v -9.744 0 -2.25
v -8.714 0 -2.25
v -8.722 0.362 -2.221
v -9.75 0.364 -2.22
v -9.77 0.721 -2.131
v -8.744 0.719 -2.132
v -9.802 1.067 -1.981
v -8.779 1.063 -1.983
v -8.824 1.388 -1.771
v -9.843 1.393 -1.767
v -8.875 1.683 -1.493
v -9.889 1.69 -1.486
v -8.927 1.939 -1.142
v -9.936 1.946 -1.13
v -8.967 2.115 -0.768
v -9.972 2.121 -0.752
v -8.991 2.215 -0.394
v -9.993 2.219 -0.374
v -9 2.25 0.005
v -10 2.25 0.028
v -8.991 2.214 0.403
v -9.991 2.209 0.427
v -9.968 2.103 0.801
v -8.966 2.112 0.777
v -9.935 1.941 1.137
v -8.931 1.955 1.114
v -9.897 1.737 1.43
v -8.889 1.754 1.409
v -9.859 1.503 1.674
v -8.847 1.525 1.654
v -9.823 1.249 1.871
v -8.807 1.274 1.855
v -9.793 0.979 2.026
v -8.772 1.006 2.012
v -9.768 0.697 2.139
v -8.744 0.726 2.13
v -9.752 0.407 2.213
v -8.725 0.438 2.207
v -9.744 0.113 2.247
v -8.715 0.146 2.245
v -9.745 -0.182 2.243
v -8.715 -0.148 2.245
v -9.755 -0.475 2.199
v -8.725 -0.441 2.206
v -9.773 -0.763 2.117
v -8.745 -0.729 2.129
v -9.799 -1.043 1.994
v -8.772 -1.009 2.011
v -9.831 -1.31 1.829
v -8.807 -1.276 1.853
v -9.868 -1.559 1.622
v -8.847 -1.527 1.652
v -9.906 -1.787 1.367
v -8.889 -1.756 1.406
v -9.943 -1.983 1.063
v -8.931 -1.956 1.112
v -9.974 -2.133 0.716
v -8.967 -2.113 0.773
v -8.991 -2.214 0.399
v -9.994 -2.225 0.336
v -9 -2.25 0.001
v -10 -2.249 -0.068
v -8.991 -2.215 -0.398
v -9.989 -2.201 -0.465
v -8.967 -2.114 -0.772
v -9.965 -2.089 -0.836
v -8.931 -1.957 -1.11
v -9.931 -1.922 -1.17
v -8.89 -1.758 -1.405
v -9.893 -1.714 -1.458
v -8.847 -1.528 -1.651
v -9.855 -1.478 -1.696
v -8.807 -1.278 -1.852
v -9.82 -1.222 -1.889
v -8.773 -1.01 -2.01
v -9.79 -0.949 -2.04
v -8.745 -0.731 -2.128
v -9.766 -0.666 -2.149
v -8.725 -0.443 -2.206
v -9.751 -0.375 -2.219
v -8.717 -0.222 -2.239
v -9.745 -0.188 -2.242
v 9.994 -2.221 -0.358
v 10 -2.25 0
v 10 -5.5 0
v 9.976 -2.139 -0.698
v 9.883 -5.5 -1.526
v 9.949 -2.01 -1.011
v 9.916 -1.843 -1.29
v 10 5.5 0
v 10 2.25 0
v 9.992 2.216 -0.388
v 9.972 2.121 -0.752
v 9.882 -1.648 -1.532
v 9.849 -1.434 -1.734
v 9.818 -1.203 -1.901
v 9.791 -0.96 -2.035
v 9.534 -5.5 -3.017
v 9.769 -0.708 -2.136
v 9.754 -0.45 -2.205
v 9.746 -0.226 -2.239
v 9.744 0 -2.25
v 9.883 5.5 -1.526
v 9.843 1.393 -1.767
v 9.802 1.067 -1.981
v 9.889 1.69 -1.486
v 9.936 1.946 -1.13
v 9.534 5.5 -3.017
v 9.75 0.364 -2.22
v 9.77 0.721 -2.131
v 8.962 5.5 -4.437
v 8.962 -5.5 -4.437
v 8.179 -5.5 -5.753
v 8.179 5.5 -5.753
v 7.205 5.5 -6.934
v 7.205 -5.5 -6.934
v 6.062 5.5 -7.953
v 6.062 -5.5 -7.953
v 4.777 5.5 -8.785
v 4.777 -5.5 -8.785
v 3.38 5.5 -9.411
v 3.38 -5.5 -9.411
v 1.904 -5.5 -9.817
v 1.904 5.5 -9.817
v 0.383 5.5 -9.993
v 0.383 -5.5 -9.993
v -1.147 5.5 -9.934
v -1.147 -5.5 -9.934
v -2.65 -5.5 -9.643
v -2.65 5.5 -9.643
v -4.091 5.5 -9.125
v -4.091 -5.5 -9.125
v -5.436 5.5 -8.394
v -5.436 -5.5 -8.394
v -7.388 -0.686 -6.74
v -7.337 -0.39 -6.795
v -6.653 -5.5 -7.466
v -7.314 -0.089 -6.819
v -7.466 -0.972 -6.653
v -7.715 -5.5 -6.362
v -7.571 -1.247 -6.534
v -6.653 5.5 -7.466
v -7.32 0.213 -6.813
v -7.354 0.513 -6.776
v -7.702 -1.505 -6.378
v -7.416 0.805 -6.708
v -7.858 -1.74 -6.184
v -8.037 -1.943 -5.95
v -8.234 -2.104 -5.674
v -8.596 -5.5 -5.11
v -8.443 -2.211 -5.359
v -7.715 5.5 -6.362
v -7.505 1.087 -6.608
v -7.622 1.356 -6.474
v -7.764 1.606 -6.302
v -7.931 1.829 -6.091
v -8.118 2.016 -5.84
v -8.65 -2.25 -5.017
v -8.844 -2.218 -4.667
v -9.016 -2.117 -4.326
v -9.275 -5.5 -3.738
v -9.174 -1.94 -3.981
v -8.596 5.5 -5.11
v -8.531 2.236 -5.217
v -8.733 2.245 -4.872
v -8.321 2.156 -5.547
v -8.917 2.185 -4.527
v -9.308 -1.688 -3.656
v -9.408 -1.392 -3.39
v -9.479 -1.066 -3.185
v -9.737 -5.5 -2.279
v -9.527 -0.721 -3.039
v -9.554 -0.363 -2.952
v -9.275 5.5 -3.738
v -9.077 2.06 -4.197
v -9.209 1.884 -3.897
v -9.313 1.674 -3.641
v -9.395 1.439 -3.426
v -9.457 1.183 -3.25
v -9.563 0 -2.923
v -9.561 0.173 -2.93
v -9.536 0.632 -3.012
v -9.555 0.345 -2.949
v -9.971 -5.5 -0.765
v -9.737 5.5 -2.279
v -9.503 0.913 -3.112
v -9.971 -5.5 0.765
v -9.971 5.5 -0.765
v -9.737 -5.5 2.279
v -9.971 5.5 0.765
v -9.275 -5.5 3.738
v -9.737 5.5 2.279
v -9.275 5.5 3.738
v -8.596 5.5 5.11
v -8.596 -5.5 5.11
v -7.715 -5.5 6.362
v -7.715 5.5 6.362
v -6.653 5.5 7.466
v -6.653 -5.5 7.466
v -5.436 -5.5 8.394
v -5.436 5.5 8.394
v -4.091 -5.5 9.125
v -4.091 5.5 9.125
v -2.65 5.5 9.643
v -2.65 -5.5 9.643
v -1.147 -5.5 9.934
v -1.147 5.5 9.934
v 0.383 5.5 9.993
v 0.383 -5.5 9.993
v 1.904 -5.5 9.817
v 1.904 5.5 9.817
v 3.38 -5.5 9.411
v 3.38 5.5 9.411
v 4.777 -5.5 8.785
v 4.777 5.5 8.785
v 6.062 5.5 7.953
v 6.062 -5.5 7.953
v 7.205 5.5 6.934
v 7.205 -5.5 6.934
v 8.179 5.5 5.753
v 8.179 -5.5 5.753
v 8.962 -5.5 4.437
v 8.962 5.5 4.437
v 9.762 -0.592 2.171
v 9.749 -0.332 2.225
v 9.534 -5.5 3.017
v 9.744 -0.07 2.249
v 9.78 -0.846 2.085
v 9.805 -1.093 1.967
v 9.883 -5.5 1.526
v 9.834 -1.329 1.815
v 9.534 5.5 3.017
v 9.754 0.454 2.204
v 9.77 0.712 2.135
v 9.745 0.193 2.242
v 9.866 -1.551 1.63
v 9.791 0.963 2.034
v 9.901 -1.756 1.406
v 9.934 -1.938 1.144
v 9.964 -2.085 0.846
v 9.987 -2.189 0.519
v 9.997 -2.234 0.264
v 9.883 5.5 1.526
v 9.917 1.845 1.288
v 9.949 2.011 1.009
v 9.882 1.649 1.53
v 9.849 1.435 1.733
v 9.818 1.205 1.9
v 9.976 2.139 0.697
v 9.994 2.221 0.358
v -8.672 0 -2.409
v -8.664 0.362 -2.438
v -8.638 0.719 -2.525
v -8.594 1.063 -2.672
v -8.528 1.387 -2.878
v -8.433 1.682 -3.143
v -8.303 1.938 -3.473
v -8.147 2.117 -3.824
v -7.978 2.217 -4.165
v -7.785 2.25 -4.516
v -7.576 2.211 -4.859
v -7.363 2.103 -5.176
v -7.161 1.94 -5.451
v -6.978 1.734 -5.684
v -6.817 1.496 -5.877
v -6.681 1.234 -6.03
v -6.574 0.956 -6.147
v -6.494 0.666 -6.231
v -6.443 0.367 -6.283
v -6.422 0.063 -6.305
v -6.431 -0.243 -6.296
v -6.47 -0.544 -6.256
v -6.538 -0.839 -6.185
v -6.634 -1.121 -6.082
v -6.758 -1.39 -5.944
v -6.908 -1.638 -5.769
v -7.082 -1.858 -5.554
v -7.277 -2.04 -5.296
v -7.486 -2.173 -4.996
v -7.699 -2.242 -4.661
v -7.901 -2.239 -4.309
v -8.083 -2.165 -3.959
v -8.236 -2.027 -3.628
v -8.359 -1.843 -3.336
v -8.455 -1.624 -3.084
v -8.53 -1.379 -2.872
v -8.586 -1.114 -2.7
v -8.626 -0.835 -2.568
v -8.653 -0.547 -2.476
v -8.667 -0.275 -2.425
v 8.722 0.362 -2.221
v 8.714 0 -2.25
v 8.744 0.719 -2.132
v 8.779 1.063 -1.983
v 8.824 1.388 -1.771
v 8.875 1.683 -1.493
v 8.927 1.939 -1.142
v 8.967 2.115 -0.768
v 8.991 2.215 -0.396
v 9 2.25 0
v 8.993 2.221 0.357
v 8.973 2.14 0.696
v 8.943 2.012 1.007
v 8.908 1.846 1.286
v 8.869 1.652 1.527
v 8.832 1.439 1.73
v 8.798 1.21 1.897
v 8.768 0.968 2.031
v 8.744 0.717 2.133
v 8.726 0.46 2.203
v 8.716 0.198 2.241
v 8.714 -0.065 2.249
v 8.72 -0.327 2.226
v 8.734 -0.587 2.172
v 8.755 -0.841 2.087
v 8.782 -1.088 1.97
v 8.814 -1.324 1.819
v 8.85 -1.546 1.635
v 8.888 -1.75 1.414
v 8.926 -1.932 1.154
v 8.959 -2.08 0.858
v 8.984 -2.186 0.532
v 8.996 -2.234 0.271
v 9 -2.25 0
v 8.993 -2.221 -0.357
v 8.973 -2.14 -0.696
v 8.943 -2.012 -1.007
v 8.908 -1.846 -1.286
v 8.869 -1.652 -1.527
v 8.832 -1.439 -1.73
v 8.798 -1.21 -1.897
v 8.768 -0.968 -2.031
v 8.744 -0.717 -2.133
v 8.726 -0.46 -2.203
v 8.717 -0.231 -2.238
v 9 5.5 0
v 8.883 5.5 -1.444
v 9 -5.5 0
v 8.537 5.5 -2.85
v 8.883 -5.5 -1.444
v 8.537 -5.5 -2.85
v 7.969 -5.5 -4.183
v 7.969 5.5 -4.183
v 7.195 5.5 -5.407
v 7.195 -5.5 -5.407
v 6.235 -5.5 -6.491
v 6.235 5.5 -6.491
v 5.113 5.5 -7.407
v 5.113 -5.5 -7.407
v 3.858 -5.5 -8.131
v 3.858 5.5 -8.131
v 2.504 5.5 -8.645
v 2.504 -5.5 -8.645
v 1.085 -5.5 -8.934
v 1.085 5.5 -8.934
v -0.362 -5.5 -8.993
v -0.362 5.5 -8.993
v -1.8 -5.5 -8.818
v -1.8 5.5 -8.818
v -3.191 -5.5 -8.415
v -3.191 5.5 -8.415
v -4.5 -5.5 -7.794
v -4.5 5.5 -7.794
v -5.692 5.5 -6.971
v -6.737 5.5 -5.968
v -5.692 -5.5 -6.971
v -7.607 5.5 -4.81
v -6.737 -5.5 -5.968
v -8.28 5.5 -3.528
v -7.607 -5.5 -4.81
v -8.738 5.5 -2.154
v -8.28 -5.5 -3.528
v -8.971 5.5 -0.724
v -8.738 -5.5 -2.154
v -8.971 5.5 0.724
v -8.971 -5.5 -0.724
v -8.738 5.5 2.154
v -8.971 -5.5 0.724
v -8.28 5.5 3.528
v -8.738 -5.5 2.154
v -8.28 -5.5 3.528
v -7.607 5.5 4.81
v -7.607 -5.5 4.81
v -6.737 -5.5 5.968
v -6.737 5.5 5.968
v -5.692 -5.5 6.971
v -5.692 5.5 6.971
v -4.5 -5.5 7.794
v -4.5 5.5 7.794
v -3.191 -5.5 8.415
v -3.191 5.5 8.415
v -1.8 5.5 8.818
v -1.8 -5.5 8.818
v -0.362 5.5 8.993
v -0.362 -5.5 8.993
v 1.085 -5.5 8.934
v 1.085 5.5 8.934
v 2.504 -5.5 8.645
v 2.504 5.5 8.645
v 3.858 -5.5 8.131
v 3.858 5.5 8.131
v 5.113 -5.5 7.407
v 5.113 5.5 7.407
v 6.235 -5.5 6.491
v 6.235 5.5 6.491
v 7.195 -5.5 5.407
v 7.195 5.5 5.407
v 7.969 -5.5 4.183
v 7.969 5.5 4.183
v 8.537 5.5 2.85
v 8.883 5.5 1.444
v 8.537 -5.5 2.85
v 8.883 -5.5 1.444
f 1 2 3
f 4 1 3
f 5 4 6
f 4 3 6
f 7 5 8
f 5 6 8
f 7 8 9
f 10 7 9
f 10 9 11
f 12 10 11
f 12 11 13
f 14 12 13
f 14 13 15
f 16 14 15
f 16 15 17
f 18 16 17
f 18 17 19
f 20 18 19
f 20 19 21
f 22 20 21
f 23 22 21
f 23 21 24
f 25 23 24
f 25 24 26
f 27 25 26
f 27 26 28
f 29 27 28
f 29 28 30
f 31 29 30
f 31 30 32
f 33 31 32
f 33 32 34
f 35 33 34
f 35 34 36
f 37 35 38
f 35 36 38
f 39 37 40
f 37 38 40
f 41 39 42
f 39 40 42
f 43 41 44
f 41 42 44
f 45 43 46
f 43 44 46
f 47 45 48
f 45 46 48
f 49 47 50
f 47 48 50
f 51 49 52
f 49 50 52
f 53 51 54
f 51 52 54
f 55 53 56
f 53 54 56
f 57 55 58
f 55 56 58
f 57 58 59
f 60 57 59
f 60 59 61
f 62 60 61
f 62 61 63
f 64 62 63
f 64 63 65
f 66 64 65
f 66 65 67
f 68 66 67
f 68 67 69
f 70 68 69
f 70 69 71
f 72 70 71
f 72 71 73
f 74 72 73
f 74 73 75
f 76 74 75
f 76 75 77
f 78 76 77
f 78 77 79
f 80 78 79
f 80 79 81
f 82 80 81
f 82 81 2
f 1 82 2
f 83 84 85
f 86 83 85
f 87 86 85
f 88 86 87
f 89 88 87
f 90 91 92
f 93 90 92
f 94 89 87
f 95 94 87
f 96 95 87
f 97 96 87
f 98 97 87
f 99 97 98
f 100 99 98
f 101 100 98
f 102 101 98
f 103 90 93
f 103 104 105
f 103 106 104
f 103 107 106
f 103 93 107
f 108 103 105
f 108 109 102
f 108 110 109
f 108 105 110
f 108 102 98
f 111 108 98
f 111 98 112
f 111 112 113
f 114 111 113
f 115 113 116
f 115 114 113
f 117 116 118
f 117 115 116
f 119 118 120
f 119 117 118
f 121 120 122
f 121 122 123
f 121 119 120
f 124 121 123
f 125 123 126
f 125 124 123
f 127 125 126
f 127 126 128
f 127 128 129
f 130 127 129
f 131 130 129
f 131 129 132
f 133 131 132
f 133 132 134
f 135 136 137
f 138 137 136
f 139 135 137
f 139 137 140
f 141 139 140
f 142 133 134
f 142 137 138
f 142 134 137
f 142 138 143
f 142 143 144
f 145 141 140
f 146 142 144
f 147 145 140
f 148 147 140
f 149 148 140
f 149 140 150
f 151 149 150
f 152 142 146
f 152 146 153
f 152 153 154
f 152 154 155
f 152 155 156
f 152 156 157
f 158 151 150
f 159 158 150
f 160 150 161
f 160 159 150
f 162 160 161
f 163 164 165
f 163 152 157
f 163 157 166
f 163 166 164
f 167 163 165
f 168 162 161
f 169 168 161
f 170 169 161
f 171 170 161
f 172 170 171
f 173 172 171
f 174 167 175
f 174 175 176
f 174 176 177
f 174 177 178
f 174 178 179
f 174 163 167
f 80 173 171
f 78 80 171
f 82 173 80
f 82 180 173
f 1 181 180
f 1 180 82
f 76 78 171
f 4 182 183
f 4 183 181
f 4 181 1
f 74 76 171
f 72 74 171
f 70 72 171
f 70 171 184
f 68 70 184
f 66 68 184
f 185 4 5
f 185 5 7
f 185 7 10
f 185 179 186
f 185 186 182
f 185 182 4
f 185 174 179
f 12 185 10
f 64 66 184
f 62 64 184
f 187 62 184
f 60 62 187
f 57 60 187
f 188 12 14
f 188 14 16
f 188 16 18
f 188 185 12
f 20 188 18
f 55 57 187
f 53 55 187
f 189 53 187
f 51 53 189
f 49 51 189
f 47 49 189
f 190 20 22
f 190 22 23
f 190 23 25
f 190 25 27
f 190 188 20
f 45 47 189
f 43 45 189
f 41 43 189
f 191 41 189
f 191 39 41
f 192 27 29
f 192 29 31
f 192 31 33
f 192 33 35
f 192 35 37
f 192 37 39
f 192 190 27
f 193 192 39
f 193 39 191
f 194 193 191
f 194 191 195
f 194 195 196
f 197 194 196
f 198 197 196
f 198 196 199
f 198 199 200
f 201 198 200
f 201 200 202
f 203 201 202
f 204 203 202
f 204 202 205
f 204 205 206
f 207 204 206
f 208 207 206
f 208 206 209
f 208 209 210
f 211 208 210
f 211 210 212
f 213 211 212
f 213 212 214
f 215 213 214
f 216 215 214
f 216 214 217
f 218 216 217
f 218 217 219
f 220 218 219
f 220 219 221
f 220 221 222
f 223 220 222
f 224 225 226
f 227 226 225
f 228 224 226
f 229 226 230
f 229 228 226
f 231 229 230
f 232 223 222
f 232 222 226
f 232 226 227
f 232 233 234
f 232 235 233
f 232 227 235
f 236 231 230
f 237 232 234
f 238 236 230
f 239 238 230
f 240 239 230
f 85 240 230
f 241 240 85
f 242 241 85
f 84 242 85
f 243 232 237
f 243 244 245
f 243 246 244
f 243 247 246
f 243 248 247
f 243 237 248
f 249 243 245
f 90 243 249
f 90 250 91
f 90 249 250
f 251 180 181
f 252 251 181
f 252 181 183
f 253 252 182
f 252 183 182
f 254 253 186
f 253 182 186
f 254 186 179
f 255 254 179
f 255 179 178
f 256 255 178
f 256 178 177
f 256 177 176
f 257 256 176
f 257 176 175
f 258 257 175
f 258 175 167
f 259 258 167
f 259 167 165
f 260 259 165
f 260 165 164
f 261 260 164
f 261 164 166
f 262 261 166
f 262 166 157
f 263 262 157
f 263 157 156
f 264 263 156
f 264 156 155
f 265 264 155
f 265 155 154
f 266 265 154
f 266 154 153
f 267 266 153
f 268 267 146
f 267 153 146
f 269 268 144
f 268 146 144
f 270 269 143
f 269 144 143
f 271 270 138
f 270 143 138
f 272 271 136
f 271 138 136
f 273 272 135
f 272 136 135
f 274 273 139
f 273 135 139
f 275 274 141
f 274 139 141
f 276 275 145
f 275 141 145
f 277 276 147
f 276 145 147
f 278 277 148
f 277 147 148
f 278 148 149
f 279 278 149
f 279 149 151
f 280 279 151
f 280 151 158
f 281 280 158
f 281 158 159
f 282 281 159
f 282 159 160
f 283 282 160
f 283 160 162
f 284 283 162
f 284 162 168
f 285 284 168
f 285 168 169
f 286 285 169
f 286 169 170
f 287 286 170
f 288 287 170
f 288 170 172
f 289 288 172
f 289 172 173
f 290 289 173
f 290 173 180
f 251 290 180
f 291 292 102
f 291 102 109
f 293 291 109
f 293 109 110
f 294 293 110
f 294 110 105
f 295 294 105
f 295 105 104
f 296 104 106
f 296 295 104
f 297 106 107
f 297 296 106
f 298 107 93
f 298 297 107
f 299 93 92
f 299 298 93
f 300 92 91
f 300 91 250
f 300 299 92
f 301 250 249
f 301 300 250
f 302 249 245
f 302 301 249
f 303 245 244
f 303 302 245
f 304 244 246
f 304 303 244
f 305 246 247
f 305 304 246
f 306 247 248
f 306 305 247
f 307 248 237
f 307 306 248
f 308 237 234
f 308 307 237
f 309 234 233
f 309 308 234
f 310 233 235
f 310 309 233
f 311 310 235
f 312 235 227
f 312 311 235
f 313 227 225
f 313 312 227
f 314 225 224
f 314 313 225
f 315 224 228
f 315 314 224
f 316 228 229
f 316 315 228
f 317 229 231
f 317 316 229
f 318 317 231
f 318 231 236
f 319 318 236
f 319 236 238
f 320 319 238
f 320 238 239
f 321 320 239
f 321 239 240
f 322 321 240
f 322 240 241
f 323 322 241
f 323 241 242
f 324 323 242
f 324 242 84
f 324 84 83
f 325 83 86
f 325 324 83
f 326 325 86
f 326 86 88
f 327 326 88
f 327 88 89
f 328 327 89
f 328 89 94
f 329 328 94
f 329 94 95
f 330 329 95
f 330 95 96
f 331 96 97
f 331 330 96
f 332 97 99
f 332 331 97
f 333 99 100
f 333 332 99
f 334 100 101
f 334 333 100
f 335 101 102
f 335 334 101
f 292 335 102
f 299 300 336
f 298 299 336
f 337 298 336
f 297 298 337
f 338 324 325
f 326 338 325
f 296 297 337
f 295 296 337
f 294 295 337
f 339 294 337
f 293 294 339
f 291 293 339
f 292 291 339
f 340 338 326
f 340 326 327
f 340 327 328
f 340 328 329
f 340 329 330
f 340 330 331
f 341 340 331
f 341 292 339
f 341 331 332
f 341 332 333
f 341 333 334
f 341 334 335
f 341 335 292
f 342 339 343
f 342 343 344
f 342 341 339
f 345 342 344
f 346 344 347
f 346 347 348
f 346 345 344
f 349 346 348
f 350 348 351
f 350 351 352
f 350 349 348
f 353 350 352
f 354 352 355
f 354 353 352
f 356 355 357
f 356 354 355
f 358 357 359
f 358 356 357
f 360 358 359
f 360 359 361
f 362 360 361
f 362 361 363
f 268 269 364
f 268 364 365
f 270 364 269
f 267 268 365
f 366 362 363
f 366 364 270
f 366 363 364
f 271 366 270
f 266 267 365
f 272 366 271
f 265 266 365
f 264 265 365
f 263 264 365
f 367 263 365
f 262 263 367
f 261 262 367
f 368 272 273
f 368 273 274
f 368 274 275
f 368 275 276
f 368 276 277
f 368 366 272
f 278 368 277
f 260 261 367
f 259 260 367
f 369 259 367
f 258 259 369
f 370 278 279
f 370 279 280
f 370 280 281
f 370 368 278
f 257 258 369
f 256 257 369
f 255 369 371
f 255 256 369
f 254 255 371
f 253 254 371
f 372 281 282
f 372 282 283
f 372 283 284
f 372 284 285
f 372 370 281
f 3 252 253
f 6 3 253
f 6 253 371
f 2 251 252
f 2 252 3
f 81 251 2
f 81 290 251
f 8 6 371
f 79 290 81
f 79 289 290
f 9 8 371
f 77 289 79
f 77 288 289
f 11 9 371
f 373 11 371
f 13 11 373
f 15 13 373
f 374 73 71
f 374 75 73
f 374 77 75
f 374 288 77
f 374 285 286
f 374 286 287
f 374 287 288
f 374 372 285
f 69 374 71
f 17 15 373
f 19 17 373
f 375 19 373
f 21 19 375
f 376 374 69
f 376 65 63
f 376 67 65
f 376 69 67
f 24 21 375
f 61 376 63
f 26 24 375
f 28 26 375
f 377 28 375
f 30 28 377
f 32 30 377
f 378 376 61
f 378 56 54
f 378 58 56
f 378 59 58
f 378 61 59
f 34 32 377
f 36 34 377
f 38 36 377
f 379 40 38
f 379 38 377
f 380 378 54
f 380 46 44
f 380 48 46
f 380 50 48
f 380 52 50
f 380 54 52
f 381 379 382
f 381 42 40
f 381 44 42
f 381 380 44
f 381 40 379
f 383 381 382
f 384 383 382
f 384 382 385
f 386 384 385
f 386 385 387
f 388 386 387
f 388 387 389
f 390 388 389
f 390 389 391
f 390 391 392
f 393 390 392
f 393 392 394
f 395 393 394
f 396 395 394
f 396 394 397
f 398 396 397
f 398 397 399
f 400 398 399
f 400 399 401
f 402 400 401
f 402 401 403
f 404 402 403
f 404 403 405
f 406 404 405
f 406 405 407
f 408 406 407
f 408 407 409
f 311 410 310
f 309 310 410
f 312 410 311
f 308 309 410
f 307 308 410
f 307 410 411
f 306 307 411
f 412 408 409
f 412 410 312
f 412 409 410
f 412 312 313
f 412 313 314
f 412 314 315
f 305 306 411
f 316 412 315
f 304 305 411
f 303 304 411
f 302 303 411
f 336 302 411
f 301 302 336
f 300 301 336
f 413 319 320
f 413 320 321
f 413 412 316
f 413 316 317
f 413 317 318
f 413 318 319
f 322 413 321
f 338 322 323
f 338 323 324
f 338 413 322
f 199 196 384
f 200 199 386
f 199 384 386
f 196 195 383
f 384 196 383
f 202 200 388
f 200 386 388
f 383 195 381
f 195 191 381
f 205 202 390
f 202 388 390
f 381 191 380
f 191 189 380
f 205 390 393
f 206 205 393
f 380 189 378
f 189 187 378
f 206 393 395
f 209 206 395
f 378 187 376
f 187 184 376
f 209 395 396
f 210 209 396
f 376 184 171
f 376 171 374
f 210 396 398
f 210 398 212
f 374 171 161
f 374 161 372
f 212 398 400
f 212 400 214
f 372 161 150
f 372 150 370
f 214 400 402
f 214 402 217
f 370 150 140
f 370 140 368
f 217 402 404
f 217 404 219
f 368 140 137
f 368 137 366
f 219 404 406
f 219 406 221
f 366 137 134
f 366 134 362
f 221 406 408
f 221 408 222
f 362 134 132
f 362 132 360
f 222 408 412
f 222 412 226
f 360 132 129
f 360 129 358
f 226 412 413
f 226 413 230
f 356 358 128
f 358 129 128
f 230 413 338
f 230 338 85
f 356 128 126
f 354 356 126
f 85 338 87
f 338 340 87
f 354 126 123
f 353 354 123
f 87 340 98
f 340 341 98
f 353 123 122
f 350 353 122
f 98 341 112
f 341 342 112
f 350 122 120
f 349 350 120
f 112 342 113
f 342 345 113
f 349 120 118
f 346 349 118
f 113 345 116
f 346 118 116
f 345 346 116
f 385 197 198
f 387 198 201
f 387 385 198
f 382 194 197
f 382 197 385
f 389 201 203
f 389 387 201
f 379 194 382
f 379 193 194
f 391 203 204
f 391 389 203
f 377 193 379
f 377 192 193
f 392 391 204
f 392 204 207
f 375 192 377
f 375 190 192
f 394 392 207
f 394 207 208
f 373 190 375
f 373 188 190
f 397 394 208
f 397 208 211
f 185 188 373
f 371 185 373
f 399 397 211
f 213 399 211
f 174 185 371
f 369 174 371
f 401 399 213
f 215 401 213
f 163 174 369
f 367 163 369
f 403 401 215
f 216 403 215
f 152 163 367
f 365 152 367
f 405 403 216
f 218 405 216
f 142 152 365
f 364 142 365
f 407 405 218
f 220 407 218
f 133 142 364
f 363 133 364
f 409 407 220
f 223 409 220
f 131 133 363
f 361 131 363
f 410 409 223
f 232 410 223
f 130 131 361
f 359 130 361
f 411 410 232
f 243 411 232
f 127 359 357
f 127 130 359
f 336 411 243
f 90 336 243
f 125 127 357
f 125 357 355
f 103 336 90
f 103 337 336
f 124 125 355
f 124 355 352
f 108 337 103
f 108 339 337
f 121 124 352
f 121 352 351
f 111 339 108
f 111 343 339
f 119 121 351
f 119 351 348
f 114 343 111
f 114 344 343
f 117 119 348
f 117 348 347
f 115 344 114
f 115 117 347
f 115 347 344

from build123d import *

# Parameters (mm, degrees)
ESBO_O1_R                  = 10
ESBO_O1_R_2                = 9
RESSALTO_EXTRUS_O1_DEPTH   = 5.5
CORTE_EXTRUS_O1_REACH      = 25.66
ESBO_O2_R                  = 2.25
ESBO_O3_R                  = 2.25
CORTE_EXTRUS_O2_DEPTH      = 11.0000001
CORTE_EXTRUS_O2_DEPTH_BACK = 11.0000001


with BuildPart() as part:
    # Esboço1 → Ressalto-extrusão1 (new body, symmetric)
    with BuildSketch(Plane(origin=(0, 0, 0), x_dir=(1, 0, 0), z_dir=(0, 1, 0))):
        Circle(ESBO_O1_R)
        Circle(ESBO_O1_R_2, mode=Mode.SUBTRACT)
    extrude(amount=RESSALTO_EXTRUS_O1_DEPTH, both=True)

    # Esboço2 → Corte-extrusão1 (cut, up to next)
    with BuildSketch(Plane(origin=(-8.660254038, 0, -5), x_dir=(-0.5, 0, 0.866025404), z_dir=(-0.866025404, 0, -0.5)), mode=Mode.PRIVATE) as corte_extrus_o1_sk1:
        Circle(ESBO_O2_R)
    corte_extrus_o1_tool1 = extrude(corte_extrus_o1_sk1.sketch, amount=-CORTE_EXTRUS_O1_REACH, mode=Mode.PRIVATE) & part.part
    add(corte_extrus_o1_tool1.solids().sort_by_distance((-8.660254, 0, -5))[0], mode=Mode.SUBTRACT)

    # Esboço3 → Corte-extrusão2 (cut, two sides)
    with BuildSketch(Plane(origin=(0, 0, 0), x_dir=(0, 0, -1), z_dir=(1, 0, 0))) as corte_extrus_o2_sk:
        Circle(ESBO_O3_R)
    extrude(amount=CORTE_EXTRUS_O2_DEPTH, mode=Mode.SUBTRACT)
    extrude(corte_extrus_o2_sk.sketch, amount=-CORTE_EXTRUS_O2_DEPTH_BACK, mode=Mode.SUBTRACT)


solid = part.part
